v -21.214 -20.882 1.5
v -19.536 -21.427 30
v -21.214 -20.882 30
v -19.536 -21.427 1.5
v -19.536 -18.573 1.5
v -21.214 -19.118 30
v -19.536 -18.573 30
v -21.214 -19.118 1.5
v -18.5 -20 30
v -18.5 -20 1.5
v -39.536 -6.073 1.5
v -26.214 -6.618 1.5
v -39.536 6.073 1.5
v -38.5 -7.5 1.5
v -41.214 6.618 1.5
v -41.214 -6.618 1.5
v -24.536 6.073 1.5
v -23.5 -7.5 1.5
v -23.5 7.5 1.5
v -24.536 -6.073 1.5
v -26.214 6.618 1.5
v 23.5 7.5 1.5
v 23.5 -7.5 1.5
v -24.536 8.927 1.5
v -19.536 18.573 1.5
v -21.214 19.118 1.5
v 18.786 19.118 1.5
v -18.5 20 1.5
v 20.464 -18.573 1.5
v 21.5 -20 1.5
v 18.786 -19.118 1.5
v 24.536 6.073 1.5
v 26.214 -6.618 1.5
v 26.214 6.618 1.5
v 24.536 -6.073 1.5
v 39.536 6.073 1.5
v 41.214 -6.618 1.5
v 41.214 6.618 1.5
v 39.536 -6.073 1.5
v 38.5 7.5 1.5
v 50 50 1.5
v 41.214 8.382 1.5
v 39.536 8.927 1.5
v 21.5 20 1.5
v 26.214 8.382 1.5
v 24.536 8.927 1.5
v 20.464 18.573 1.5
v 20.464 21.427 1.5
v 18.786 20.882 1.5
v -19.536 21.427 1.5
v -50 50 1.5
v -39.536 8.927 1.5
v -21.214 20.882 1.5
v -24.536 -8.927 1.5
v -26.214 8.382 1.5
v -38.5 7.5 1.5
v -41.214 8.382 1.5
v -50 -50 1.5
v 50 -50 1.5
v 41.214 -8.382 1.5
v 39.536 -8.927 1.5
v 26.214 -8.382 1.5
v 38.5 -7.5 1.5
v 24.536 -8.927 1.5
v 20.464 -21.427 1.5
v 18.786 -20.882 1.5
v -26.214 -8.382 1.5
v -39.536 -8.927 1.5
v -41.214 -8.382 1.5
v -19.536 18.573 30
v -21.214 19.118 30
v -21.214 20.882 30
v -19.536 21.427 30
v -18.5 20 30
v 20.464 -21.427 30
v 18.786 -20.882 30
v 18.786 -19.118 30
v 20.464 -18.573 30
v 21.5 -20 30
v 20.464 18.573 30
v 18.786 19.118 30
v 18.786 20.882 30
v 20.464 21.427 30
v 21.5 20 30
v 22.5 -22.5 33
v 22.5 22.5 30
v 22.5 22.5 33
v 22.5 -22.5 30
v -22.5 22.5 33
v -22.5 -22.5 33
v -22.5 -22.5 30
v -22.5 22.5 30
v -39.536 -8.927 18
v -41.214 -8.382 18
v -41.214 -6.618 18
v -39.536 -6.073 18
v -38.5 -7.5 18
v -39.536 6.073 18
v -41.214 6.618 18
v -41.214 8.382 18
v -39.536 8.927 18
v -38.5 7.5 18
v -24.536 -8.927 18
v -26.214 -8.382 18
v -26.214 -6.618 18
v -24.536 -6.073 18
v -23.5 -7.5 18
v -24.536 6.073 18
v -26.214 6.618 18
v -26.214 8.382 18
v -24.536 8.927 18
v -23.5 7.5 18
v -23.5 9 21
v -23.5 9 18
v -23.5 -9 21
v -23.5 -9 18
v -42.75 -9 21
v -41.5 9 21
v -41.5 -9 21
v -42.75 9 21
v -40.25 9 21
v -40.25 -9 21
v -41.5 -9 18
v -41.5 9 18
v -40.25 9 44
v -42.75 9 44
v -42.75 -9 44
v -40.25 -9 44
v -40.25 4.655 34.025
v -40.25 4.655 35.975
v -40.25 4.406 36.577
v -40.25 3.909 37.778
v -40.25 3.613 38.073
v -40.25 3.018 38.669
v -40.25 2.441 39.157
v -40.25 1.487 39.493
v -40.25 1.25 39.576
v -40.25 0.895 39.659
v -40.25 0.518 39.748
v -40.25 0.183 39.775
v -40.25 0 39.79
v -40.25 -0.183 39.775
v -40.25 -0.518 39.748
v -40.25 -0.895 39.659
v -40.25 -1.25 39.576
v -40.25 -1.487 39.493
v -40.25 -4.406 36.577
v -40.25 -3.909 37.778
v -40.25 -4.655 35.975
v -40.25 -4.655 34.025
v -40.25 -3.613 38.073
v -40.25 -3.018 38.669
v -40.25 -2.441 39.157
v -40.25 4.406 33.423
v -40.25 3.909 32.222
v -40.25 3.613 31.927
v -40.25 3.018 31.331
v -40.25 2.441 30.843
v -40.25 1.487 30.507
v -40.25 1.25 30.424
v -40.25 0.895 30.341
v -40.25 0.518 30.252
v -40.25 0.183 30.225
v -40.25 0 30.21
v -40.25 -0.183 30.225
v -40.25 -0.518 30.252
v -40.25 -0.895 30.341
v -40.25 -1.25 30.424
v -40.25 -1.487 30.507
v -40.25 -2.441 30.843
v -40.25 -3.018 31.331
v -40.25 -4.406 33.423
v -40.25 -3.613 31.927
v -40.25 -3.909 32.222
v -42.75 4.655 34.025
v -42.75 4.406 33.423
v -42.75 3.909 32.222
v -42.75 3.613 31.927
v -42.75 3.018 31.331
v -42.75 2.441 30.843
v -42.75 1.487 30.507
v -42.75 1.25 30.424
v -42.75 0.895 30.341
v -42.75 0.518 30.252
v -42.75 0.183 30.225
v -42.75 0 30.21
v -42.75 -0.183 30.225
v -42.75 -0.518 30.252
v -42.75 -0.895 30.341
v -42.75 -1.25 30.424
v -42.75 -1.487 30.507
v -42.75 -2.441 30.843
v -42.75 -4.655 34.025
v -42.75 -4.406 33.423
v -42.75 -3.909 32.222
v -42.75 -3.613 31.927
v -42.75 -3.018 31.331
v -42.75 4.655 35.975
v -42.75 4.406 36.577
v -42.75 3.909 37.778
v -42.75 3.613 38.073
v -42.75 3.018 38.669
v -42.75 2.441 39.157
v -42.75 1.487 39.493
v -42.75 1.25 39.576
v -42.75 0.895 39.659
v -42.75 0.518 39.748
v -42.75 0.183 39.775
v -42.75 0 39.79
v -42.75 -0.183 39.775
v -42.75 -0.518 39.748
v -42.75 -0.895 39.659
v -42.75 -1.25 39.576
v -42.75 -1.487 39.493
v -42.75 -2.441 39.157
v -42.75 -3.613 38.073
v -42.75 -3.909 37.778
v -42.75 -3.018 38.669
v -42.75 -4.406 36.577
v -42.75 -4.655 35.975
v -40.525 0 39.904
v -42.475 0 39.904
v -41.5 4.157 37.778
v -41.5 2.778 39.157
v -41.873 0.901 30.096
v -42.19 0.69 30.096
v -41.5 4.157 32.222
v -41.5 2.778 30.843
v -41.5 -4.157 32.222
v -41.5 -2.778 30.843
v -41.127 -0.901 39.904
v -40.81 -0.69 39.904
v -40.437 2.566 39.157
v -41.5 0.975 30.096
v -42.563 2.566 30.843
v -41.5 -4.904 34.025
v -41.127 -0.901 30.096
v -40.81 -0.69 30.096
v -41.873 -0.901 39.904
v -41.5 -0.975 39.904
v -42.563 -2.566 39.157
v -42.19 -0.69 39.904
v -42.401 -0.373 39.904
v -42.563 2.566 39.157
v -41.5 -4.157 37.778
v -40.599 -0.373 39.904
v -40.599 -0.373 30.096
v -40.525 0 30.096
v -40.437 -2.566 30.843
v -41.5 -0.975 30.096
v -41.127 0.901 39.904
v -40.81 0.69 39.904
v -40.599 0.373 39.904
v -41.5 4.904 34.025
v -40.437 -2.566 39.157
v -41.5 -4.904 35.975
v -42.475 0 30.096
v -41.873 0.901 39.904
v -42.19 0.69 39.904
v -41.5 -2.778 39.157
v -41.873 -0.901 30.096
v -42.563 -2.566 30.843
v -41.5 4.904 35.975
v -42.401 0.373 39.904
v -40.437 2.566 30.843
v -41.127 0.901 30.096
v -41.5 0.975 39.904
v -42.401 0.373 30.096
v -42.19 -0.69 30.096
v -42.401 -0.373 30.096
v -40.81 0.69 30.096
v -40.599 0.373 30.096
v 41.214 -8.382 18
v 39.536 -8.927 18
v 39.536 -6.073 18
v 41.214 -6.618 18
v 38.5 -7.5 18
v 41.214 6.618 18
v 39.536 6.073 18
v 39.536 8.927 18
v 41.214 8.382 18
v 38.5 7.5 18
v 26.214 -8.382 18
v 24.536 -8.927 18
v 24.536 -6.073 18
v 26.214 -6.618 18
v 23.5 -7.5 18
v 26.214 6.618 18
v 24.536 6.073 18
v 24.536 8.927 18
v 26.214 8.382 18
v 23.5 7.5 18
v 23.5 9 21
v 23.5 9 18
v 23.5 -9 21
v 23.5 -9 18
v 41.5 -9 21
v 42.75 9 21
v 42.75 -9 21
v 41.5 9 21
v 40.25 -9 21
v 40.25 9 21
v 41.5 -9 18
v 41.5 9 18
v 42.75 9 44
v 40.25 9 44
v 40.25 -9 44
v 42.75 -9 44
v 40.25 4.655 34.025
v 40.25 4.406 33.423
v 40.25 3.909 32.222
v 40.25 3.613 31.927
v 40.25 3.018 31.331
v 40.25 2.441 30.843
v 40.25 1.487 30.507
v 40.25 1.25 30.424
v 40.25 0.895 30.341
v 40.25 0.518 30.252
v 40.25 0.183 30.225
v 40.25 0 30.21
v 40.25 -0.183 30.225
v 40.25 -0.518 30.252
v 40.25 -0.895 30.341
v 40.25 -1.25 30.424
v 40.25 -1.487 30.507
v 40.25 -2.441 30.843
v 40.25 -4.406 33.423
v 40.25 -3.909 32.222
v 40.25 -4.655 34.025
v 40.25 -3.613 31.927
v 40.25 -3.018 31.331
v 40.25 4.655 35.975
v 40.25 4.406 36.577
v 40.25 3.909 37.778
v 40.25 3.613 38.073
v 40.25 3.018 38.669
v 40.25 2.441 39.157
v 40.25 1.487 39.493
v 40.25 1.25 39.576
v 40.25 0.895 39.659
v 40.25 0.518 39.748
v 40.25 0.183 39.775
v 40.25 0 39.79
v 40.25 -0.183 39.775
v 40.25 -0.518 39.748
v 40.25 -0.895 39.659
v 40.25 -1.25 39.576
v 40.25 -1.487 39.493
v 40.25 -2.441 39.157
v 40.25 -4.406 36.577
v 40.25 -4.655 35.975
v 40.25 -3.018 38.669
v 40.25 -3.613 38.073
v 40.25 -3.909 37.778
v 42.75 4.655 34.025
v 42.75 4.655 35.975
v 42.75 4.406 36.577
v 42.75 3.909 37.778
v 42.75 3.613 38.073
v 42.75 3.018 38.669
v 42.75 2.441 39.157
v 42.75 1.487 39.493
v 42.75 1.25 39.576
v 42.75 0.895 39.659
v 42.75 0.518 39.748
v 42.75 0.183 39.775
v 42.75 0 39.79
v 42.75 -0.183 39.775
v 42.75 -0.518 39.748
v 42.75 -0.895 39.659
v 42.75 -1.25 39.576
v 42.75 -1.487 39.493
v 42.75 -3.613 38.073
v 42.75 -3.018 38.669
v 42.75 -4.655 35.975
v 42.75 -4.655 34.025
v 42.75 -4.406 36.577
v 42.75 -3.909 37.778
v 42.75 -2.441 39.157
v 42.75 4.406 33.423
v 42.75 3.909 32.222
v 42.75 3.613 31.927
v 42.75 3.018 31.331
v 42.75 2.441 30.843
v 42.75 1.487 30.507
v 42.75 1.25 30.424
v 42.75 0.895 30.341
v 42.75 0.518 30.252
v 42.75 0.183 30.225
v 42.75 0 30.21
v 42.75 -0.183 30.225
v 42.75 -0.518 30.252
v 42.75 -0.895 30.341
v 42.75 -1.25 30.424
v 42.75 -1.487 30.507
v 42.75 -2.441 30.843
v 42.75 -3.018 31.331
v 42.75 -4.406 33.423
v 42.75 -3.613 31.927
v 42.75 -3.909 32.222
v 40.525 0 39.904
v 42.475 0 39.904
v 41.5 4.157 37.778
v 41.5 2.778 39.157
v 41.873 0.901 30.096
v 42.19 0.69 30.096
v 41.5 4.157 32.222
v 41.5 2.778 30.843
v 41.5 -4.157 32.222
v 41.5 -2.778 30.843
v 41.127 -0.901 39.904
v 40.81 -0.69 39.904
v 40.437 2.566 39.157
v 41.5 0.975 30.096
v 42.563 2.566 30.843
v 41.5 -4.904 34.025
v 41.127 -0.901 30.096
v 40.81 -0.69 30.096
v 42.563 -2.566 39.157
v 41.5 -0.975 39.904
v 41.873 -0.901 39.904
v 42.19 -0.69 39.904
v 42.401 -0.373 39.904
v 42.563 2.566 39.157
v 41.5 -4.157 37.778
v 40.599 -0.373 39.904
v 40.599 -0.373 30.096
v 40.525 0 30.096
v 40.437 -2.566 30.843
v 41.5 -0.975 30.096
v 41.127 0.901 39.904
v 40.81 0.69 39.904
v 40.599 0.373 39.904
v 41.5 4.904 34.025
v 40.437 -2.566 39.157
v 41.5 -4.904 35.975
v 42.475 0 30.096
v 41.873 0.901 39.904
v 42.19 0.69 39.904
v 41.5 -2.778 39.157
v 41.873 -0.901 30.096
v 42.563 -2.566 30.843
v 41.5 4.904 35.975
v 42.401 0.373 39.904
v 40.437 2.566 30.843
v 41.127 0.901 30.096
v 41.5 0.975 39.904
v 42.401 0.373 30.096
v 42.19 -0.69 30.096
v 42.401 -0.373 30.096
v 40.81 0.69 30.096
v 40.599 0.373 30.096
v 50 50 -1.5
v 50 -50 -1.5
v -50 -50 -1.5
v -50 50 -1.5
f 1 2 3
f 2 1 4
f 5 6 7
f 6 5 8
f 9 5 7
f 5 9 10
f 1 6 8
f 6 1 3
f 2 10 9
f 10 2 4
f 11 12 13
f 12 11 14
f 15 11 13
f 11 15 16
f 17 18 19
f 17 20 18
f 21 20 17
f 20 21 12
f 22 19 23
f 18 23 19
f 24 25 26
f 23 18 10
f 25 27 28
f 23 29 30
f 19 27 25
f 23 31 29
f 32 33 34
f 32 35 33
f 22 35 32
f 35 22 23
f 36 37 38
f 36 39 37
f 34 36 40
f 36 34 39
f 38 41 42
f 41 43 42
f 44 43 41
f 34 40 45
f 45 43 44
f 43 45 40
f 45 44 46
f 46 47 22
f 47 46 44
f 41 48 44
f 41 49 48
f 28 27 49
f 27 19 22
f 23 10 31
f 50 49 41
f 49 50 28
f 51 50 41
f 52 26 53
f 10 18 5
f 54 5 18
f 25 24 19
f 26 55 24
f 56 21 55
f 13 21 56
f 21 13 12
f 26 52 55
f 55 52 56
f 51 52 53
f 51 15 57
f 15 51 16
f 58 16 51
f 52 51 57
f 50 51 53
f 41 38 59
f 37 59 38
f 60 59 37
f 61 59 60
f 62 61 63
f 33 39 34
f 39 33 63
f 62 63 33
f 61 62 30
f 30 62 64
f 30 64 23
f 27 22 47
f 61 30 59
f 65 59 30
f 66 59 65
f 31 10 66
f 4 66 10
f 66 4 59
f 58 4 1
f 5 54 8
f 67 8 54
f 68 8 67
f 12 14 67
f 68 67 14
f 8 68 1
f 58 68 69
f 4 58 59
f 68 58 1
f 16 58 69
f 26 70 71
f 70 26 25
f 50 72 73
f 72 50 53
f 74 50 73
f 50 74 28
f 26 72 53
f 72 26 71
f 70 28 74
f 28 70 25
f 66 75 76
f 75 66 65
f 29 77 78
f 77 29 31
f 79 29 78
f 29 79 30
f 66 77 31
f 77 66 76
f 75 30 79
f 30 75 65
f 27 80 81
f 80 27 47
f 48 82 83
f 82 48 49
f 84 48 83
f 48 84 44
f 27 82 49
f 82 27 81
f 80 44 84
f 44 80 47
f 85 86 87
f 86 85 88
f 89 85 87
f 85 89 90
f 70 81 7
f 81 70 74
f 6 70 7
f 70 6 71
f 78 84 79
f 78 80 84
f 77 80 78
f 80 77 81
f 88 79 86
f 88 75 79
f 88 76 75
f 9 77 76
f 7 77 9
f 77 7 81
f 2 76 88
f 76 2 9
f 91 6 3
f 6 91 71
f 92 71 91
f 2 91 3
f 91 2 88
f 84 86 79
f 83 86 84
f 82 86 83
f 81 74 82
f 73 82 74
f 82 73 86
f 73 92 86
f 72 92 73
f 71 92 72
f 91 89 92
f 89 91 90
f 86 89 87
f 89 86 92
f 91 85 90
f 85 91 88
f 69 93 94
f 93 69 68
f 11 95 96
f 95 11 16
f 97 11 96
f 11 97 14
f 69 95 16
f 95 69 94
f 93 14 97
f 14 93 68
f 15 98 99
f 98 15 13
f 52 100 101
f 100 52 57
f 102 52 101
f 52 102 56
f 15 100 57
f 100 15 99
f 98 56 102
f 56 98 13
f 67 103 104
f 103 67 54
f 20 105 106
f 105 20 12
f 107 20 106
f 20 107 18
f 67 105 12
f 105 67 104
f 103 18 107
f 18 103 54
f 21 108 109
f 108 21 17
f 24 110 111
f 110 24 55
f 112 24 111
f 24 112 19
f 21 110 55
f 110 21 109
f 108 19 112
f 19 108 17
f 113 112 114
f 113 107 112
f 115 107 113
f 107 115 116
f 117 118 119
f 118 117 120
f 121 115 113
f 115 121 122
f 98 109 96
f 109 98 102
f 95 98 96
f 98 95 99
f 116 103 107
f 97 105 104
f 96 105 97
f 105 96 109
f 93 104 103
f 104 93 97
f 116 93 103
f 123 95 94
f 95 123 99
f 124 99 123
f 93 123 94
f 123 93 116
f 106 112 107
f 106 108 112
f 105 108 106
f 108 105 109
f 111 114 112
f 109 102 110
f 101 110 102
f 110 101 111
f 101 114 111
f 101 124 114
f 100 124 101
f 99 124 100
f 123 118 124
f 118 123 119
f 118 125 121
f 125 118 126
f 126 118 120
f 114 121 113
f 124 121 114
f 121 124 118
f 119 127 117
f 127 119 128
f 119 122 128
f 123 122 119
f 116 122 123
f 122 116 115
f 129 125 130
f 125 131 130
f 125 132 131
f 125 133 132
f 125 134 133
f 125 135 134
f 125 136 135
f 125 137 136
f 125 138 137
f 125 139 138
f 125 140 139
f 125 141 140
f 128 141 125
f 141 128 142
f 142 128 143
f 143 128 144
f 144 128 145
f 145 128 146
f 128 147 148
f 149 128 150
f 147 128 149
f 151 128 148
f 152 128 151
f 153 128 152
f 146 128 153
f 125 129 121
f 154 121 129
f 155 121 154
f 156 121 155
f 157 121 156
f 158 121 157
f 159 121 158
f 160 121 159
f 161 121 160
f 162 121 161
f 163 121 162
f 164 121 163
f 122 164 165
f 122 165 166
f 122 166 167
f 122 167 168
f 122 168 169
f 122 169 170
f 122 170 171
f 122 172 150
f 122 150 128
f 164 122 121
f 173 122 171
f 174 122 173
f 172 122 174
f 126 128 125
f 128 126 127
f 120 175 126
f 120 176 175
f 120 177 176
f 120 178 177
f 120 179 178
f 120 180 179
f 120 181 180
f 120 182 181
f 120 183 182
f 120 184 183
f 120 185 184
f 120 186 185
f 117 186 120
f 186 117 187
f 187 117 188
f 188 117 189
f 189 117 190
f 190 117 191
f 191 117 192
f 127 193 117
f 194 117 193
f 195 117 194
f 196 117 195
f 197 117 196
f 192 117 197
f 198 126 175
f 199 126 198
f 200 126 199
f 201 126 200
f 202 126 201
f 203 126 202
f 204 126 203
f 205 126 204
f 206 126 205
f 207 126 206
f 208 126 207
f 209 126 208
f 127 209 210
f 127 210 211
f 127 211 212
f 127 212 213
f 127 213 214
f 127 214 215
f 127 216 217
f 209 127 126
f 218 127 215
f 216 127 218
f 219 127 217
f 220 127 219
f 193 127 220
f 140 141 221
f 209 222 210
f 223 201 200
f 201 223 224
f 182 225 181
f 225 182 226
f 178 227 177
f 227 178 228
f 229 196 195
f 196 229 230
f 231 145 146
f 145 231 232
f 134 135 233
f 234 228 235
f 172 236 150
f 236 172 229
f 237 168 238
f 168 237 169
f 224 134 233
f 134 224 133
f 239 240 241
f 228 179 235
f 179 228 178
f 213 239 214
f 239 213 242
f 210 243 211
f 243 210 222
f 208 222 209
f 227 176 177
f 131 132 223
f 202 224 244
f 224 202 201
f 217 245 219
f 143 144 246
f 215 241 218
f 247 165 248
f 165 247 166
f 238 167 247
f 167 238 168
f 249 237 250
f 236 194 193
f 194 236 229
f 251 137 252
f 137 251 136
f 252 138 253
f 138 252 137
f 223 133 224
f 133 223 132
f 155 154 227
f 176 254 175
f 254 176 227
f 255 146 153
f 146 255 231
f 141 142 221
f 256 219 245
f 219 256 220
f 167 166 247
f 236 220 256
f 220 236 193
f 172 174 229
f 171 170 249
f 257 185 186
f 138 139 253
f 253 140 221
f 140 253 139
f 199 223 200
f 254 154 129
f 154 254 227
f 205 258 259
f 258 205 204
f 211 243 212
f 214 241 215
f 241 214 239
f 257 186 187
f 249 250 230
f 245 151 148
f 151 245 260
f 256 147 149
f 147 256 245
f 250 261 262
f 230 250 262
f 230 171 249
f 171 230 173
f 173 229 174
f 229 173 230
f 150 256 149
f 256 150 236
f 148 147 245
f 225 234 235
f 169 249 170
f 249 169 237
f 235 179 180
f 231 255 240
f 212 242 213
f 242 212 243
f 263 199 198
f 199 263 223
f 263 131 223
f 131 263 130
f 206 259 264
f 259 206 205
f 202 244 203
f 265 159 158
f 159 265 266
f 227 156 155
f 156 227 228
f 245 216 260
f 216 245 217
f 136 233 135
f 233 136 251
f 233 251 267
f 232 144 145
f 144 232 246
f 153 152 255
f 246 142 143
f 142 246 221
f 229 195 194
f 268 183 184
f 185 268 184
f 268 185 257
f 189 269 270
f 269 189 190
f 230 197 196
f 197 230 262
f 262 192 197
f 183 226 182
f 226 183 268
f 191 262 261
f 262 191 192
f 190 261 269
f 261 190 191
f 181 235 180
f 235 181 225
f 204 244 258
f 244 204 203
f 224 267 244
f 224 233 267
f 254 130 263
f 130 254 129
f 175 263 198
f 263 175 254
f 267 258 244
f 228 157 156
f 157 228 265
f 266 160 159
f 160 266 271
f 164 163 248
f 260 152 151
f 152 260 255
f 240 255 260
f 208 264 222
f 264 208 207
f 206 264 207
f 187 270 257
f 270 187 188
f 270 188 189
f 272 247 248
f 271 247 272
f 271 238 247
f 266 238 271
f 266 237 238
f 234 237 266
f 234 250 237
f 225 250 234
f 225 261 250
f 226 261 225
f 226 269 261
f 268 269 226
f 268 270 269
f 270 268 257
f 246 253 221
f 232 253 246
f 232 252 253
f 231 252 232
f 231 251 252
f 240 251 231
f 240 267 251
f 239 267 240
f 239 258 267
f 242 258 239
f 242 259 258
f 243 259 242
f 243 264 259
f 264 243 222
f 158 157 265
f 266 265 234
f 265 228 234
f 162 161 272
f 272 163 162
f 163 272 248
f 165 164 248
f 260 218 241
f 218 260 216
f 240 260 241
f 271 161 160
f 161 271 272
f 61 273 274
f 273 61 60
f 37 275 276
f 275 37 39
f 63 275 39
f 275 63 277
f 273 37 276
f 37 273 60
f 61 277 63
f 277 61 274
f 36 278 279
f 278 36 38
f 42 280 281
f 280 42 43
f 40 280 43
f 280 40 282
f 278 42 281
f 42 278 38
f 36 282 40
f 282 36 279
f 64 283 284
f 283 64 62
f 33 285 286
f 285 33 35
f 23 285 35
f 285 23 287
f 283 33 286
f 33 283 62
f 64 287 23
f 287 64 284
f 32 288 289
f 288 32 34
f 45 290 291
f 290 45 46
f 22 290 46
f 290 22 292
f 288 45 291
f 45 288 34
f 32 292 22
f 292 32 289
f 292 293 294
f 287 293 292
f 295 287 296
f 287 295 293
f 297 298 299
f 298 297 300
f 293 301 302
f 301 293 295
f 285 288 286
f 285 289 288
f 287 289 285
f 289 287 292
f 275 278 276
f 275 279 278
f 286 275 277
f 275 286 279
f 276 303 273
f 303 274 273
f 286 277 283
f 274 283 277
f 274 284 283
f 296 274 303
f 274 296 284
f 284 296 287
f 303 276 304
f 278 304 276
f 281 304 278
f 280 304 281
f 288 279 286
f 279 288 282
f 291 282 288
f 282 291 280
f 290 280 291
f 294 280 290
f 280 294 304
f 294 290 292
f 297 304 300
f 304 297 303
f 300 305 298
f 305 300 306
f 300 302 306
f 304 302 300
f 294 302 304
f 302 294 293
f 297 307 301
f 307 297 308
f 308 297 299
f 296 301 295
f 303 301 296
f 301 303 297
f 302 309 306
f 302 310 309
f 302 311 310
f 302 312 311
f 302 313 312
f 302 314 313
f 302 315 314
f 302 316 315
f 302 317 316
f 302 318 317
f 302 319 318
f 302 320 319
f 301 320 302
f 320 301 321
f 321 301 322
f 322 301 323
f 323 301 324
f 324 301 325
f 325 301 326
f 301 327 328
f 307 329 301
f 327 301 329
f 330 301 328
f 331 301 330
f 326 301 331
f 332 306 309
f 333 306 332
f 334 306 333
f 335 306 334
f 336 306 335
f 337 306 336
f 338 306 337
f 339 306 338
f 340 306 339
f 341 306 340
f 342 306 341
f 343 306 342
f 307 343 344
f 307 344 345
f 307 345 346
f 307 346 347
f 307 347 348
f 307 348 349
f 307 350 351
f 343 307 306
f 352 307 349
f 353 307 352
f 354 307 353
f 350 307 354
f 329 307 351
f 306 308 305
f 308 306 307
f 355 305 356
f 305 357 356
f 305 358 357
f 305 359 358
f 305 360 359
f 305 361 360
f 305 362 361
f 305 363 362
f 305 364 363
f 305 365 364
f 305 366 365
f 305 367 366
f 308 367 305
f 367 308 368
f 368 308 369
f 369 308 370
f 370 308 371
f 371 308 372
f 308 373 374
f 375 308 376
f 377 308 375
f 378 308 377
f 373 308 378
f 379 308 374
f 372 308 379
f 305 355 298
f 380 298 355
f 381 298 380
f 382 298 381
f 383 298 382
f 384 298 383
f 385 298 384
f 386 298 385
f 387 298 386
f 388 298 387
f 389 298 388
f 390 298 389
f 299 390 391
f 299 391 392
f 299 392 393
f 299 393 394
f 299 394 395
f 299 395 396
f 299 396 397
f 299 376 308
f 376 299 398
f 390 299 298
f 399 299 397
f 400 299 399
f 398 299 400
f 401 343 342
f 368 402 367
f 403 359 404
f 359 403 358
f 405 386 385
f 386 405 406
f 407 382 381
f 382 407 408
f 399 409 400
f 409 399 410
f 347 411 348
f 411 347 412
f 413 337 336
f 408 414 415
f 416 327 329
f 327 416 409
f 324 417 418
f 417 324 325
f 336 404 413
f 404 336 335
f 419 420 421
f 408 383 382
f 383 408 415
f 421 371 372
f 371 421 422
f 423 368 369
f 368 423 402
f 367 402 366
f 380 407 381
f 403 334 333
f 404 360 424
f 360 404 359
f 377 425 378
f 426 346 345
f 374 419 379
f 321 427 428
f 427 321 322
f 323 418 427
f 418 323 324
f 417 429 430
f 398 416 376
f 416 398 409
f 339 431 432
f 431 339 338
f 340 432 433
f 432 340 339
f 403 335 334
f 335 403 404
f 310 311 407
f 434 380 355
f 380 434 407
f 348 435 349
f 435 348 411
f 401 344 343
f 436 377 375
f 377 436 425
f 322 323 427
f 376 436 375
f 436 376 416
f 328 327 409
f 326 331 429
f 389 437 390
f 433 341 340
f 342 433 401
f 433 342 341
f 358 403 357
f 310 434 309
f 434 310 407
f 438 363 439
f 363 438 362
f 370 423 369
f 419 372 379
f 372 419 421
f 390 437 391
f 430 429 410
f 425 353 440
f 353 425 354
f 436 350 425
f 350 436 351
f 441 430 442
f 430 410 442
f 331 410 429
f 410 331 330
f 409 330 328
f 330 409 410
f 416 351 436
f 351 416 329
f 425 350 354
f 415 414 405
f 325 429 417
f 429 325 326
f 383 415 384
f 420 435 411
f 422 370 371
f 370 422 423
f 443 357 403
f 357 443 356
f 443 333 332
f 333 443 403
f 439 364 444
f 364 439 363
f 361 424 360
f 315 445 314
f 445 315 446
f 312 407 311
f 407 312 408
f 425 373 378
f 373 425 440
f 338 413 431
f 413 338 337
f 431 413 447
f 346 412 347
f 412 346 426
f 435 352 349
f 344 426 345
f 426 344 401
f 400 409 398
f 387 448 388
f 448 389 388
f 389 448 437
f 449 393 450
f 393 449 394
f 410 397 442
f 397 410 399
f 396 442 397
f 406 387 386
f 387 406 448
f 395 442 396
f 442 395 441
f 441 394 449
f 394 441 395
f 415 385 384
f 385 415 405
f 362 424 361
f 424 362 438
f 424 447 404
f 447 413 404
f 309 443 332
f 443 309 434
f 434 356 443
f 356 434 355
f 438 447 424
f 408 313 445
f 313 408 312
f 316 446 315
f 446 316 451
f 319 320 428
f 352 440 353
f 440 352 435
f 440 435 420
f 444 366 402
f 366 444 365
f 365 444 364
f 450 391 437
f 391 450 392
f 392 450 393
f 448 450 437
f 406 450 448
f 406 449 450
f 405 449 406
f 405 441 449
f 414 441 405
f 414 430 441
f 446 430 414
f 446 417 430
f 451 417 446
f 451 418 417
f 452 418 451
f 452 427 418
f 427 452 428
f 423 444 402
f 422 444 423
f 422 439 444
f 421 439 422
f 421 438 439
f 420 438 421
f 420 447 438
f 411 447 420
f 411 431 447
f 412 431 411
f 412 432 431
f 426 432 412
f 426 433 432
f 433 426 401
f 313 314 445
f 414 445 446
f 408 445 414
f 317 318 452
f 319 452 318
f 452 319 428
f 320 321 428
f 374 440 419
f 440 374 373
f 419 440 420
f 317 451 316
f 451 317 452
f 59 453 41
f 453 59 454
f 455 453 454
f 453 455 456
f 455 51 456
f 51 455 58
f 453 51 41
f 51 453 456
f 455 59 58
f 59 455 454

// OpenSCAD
module piso()
{
    cube([100,100,3],center=true);
}

module table()
{
    //first leg
    translate([-20,-20,1.5])cylinder(h = 30, r=1.5); // normal height of a table
    //second leg
    translate([-20,20,1.5])cylinder(h = 30, r=1.5); // normal height of a table
    //third leg
    translate([20,-20,1.5])cylinder(h = 30, r=1.5); // normal height of a table
    //fourth leg
    translate([20,20,1.5])cylinder(h = 30, r=1.5); // normal height of a table
    translate([0,0,31.5])cube([45,45,3],center=true);    
}

module chairBase()
{
    //first leg
    translate([-40,-7.5,1.5])cylinder(h = 18, r=1.5); // normal height of a table
    //second leg
    translate([-40,7.5,1.5])cylinder(h = 18, r=1.5); // normal height of a table
    //third leg
    translate([-25,-7.5,1.5])cylinder(h = 18, r=1.5); // normal height of a table
    //fourth leg
    translate([-25,7.5,1.5])cylinder(h = 18, r=1.5); // normal height of a table
    translate([-32.5,0,19.5])cube([18,18,3],center=true);     
}

module chairTop()
{
    difference(){
    //chair back
    translate([-41.5,0,32.5])cube([2.5,18,23],center=true);
    //Some design
    translate([-41.5,0,35])sphere(5);     
    };    
}

module chair()
{
    chairBase();
    chairTop();
}



piso();
table();
chair();
mirror([1,0,0])chair();
